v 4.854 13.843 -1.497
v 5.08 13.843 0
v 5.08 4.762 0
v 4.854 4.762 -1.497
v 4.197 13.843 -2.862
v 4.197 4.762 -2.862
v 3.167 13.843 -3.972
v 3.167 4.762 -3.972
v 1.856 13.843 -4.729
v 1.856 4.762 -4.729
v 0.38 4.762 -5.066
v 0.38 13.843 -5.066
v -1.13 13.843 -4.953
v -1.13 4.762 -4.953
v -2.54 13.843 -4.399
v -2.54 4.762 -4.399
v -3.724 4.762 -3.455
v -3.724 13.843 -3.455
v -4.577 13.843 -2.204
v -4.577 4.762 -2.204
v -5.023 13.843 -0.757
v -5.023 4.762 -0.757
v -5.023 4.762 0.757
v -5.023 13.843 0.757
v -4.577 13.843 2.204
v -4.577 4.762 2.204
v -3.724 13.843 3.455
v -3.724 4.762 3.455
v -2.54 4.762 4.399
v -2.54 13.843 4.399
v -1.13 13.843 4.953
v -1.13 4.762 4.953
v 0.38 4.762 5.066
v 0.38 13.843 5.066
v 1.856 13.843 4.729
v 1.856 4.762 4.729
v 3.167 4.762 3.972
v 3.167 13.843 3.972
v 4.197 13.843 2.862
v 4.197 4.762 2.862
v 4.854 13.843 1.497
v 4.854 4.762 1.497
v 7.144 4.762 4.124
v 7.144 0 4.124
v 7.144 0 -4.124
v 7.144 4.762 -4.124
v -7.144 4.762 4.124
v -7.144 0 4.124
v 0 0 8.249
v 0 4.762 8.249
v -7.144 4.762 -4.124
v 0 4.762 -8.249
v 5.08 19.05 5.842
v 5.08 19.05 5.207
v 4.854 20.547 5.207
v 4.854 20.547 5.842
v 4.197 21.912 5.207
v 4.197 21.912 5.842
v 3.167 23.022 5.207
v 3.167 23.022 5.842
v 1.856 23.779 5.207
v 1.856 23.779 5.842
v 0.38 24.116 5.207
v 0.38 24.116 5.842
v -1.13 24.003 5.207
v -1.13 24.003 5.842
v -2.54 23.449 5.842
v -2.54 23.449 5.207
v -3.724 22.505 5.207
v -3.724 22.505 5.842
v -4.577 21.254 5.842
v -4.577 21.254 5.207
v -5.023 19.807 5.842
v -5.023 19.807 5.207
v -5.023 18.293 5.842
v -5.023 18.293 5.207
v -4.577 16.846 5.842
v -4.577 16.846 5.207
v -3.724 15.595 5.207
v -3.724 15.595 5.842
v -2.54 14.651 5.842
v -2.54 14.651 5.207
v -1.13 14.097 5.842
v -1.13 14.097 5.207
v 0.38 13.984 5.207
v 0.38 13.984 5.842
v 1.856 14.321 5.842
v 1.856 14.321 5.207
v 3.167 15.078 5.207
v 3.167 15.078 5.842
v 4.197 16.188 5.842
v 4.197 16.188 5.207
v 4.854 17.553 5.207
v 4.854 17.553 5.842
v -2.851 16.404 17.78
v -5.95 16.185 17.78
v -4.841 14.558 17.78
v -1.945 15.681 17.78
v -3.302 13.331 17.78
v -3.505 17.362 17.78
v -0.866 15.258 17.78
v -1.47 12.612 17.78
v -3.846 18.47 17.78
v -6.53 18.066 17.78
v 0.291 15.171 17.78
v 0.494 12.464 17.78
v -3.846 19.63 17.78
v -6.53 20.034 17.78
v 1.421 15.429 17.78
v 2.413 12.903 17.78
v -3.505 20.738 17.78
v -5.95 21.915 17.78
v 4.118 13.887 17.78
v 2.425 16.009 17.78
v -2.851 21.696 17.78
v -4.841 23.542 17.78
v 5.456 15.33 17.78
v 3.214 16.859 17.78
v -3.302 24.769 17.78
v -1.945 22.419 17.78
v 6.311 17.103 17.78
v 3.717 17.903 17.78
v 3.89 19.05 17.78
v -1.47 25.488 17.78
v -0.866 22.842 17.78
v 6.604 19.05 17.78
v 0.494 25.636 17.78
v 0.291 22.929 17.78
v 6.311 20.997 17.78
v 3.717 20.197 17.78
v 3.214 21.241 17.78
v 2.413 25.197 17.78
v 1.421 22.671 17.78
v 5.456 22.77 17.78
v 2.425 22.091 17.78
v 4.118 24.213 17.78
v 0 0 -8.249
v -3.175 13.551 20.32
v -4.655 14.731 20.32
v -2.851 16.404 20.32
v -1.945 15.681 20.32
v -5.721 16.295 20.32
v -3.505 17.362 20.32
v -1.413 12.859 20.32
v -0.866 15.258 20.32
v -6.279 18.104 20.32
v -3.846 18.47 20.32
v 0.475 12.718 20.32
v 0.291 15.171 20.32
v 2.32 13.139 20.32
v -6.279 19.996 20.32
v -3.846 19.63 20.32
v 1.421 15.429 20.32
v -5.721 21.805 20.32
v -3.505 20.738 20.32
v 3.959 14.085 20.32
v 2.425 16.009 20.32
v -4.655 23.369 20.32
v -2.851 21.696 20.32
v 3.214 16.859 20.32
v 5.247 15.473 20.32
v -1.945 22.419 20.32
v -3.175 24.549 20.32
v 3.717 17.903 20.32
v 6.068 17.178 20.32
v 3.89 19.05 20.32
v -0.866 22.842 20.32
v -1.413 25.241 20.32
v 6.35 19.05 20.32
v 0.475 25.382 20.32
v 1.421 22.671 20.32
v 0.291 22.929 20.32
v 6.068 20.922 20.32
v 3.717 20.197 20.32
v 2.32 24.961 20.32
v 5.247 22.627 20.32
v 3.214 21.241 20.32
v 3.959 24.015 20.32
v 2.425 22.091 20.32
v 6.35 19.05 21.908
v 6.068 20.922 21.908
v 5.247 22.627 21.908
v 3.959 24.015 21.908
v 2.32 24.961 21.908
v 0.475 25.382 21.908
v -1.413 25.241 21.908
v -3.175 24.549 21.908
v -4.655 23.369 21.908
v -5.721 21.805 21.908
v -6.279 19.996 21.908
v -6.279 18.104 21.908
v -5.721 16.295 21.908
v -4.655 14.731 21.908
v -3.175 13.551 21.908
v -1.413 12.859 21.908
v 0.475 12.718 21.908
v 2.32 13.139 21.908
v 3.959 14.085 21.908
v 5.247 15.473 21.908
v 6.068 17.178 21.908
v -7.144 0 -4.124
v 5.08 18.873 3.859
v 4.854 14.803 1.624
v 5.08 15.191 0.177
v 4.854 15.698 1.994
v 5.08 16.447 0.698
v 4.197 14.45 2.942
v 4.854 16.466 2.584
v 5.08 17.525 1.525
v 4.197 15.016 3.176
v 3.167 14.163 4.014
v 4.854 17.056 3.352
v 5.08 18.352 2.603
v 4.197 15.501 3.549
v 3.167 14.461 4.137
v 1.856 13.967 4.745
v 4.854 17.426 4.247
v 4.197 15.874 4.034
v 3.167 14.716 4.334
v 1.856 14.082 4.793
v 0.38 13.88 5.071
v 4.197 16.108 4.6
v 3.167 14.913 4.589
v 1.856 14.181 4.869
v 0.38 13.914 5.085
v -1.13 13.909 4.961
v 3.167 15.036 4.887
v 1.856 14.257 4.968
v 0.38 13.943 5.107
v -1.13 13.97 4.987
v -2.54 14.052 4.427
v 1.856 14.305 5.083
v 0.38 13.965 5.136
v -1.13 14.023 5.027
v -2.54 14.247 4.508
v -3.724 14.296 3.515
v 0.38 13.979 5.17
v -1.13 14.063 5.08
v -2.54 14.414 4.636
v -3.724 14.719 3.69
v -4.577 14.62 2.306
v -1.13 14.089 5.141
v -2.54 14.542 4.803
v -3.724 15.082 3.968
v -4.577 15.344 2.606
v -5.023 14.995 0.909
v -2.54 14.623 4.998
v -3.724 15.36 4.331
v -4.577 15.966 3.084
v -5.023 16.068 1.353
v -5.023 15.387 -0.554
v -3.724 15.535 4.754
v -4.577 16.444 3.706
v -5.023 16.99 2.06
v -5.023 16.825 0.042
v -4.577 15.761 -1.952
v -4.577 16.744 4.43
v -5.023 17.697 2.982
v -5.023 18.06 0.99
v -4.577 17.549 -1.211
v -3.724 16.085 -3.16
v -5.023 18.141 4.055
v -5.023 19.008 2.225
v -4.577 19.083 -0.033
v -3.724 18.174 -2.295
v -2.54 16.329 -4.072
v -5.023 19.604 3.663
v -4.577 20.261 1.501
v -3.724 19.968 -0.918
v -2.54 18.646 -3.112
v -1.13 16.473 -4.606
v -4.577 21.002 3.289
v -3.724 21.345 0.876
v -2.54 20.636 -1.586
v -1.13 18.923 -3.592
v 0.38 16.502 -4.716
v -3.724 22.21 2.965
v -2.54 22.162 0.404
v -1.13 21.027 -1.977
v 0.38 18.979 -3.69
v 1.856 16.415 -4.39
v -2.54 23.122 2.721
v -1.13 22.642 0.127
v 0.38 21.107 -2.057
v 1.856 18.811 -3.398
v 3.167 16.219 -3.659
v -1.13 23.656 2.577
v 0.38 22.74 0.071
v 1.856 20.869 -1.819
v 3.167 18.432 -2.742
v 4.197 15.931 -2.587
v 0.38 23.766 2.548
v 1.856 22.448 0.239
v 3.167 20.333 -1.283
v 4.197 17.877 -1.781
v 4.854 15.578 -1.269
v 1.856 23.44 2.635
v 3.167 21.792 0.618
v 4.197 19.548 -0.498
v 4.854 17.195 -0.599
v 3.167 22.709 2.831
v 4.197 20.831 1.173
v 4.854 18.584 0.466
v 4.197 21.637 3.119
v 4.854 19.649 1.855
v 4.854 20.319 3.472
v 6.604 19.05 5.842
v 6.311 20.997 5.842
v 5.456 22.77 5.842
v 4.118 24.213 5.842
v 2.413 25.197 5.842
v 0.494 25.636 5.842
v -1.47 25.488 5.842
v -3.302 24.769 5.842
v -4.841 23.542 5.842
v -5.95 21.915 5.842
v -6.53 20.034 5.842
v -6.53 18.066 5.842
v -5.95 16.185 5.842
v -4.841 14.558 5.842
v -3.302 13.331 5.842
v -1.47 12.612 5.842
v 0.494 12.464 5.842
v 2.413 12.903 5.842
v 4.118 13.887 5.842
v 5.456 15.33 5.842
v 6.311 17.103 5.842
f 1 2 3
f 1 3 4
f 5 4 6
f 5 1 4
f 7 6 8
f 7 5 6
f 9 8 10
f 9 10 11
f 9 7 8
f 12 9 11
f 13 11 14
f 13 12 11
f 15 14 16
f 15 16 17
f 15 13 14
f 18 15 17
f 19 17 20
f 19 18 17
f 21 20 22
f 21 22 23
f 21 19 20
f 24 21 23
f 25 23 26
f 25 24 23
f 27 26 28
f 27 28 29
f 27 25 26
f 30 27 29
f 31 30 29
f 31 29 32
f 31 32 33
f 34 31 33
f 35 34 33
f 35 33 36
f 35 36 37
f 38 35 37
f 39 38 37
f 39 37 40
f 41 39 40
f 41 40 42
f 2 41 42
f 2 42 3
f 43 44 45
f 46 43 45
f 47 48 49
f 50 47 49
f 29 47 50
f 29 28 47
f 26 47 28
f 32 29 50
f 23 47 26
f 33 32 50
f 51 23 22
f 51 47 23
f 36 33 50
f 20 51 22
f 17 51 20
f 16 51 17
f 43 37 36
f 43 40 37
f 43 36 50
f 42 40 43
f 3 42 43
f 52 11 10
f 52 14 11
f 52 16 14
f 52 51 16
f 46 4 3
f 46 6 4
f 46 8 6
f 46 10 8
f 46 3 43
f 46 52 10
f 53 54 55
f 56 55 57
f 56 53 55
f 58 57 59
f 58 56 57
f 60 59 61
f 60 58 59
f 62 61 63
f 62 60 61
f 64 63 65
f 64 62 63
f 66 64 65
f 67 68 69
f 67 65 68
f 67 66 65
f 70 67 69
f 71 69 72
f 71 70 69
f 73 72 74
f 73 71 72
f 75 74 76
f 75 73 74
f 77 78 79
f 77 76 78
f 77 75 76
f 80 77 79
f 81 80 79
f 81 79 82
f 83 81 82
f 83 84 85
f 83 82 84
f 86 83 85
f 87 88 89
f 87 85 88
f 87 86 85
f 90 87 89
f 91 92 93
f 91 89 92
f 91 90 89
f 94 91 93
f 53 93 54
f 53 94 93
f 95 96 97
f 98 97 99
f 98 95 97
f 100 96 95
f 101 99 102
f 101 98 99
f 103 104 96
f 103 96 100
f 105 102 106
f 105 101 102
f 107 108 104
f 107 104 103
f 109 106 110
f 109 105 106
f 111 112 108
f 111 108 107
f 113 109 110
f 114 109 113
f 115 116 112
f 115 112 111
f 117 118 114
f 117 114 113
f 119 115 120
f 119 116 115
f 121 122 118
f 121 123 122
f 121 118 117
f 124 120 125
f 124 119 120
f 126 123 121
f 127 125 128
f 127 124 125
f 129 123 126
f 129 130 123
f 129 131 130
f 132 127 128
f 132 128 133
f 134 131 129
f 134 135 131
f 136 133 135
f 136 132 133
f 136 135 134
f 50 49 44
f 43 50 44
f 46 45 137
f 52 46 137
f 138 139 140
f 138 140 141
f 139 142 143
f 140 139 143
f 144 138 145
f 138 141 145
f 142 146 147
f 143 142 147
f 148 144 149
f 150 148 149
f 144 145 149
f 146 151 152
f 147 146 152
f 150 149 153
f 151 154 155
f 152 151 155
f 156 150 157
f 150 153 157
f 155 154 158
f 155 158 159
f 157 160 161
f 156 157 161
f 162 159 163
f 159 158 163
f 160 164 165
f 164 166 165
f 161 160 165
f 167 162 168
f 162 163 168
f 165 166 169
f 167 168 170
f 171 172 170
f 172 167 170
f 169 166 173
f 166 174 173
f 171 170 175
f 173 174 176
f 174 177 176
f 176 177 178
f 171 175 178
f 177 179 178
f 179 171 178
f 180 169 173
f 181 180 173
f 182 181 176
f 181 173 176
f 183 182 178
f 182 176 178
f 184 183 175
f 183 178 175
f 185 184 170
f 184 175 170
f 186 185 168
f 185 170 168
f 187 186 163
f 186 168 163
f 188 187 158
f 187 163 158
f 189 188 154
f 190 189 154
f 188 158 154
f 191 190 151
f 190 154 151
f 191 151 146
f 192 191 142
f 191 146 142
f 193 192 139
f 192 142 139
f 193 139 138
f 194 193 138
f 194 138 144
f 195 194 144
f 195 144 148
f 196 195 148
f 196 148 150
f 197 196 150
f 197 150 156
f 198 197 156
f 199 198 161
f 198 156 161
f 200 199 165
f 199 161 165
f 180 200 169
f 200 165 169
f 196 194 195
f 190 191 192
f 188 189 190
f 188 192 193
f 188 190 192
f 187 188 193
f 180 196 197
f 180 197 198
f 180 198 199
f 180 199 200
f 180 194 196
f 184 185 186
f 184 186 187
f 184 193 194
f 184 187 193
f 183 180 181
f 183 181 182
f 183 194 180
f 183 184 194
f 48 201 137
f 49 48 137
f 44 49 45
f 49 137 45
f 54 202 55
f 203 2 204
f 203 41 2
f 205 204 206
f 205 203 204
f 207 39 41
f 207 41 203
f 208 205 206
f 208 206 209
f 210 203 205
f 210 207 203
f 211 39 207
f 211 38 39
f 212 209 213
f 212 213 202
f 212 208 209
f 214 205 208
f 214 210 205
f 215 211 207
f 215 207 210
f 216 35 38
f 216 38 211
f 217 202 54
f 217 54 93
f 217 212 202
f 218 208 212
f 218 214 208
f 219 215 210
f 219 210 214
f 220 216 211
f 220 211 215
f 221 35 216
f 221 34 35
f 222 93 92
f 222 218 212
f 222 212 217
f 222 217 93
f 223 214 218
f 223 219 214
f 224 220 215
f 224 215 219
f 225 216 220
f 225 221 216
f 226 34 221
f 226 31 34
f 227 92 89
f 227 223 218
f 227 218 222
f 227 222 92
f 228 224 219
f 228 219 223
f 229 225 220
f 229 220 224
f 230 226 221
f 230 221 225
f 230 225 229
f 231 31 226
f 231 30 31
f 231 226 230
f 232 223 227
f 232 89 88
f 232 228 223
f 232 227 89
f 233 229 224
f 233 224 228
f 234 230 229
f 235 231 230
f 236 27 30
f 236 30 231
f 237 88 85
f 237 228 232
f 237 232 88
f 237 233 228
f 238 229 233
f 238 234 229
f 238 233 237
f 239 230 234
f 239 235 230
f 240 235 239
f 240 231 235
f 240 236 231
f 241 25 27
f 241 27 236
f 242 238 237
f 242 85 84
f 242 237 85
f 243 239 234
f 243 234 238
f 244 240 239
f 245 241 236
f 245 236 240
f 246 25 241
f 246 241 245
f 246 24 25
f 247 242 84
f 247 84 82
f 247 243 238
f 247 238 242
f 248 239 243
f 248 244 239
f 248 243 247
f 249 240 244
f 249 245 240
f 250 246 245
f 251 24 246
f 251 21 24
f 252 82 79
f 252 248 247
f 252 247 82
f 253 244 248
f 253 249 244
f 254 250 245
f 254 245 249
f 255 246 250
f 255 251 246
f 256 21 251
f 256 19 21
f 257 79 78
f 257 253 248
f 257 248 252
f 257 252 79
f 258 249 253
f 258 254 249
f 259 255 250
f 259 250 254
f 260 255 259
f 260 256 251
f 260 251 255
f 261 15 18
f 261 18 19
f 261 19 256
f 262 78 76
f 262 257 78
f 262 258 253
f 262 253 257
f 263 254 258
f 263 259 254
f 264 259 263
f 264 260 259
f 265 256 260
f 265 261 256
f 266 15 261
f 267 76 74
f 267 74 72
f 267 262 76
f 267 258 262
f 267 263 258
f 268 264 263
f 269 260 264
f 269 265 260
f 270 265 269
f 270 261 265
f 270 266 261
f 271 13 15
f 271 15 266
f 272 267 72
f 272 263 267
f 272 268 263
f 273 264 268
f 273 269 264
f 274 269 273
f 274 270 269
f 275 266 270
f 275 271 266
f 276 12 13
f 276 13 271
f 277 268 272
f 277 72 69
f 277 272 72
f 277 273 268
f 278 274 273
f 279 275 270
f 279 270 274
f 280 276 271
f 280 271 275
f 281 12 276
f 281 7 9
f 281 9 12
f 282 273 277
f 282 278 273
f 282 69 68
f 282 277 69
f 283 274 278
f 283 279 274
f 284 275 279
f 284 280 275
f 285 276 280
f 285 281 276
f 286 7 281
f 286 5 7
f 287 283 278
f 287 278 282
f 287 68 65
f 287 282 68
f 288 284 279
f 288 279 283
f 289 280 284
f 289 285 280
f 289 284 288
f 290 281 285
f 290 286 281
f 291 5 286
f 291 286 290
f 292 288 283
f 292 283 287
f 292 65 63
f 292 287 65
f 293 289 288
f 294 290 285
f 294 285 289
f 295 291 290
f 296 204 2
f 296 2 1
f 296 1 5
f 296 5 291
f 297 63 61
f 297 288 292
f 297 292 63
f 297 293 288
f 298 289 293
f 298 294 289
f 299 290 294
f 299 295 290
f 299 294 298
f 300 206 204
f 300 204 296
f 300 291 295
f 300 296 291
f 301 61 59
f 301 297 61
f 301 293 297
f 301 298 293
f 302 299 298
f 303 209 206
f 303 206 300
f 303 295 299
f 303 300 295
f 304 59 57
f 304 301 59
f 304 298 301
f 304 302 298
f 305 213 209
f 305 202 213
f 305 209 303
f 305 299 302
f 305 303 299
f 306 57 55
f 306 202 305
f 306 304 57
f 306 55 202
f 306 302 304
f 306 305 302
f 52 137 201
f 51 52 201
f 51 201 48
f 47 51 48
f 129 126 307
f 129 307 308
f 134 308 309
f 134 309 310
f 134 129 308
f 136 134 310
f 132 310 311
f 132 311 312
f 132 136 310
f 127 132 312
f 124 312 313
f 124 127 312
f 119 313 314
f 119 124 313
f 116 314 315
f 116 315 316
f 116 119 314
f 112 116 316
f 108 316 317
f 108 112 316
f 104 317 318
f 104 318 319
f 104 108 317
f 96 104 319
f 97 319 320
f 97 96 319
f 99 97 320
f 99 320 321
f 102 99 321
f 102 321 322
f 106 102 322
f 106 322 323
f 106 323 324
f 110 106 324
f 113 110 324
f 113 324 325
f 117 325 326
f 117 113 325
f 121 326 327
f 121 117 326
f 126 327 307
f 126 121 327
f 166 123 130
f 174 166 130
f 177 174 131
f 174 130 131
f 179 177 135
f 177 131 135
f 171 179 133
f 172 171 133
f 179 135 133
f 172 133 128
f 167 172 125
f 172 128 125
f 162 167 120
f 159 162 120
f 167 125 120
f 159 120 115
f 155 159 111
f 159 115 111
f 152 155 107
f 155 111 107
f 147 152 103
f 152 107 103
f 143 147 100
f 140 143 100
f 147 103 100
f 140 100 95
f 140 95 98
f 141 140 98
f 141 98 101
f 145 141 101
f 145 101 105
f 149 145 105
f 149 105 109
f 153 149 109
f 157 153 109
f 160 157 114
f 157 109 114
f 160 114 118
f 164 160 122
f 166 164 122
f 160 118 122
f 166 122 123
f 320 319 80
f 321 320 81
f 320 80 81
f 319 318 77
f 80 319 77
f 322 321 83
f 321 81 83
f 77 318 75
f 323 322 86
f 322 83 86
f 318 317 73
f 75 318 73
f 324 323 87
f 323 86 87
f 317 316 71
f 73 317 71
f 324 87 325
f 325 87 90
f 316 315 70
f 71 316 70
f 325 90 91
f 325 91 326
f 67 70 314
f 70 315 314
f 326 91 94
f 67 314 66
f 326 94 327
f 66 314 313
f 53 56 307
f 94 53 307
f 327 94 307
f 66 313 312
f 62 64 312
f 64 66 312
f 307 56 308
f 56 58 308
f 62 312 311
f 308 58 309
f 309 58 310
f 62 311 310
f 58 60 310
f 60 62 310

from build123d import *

# Parameters (mm, degrees)
BOSS_EXTRUDE1_DEPTH = 4.7625
SKETCH2_R           = 5.08
SKETCH4_R           = 6.604
BOSS_EXTRUDE2_DEPTH = 11.938
SKETCH5_R           = 3.889836973
BOSS_EXTRUDE3_DEPTH = 2.54
SKETCH6_R           = 6.35
BOSS_EXTRUDE4_DEPTH = 1.5875


with BuildPart() as part:
    # Sketch1 → Boss-Extrude1 (new body)
    with BuildSketch(Plane(origin=(0, 0, 0), x_dir=(1, 0, 0), z_dir=(0, 1, 0))):
        Polygon((0, 8.248891971), (-7.14375, 4.124445986), (-7.14375, -4.124445986), (0, -8.248891971), (7.14375, -4.124445986), (7.14375, 4.124445986), align=None)
    extrude(amount=BOSS_EXTRUDE1_DEPTH)

    # Sweep3: sweep along a path in Sketch3
    with BuildLine(Plane(origin=(0, 0, 0), x_dir=(0, 0, -1), z_dir=(1, 0, 0))) as sweep3_path:
        Line((0, 4.7625), (0, 13.843))
        ThreePointArc((0, 13.843), (-1.52509499, 17.52490501), (-5.207, 19.05))
        Line((-5.207, 19.05), (-17.78, 19.05))
    # Sketch2 → Sweep3 (sweep)
    with BuildSketch(Plane(origin=(0, 4.7625, 0), x_dir=(1, 0, 0), z_dir=(0, 1, 0))):
        Circle(SKETCH2_R)
    sweep(path=sweep3_path.line)

    # Sketch4 → Boss-Extrude2 (add)
    with BuildSketch(Plane.XY.offset(17.78)):
        with Locations((0, 19.05)):
            Circle(SKETCH4_R)
    extrude(amount=-BOSS_EXTRUDE2_DEPTH)

    # Sketch5 → Boss-Extrude3 (add)
    with BuildSketch(Plane.XY.offset(17.78)):
        with Locations((0, 19.05)):
            Circle(SKETCH5_R)
    extrude(amount=BOSS_EXTRUDE3_DEPTH)

    # Sketch6 → Boss-Extrude4 (add)
    with BuildSketch(Plane.XY.offset(20.32)):
        with Locations((0, 19.05)):
            Circle(SKETCH6_R)
    extrude(amount=BOSS_EXTRUDE4_DEPTH)


solid = part.part
